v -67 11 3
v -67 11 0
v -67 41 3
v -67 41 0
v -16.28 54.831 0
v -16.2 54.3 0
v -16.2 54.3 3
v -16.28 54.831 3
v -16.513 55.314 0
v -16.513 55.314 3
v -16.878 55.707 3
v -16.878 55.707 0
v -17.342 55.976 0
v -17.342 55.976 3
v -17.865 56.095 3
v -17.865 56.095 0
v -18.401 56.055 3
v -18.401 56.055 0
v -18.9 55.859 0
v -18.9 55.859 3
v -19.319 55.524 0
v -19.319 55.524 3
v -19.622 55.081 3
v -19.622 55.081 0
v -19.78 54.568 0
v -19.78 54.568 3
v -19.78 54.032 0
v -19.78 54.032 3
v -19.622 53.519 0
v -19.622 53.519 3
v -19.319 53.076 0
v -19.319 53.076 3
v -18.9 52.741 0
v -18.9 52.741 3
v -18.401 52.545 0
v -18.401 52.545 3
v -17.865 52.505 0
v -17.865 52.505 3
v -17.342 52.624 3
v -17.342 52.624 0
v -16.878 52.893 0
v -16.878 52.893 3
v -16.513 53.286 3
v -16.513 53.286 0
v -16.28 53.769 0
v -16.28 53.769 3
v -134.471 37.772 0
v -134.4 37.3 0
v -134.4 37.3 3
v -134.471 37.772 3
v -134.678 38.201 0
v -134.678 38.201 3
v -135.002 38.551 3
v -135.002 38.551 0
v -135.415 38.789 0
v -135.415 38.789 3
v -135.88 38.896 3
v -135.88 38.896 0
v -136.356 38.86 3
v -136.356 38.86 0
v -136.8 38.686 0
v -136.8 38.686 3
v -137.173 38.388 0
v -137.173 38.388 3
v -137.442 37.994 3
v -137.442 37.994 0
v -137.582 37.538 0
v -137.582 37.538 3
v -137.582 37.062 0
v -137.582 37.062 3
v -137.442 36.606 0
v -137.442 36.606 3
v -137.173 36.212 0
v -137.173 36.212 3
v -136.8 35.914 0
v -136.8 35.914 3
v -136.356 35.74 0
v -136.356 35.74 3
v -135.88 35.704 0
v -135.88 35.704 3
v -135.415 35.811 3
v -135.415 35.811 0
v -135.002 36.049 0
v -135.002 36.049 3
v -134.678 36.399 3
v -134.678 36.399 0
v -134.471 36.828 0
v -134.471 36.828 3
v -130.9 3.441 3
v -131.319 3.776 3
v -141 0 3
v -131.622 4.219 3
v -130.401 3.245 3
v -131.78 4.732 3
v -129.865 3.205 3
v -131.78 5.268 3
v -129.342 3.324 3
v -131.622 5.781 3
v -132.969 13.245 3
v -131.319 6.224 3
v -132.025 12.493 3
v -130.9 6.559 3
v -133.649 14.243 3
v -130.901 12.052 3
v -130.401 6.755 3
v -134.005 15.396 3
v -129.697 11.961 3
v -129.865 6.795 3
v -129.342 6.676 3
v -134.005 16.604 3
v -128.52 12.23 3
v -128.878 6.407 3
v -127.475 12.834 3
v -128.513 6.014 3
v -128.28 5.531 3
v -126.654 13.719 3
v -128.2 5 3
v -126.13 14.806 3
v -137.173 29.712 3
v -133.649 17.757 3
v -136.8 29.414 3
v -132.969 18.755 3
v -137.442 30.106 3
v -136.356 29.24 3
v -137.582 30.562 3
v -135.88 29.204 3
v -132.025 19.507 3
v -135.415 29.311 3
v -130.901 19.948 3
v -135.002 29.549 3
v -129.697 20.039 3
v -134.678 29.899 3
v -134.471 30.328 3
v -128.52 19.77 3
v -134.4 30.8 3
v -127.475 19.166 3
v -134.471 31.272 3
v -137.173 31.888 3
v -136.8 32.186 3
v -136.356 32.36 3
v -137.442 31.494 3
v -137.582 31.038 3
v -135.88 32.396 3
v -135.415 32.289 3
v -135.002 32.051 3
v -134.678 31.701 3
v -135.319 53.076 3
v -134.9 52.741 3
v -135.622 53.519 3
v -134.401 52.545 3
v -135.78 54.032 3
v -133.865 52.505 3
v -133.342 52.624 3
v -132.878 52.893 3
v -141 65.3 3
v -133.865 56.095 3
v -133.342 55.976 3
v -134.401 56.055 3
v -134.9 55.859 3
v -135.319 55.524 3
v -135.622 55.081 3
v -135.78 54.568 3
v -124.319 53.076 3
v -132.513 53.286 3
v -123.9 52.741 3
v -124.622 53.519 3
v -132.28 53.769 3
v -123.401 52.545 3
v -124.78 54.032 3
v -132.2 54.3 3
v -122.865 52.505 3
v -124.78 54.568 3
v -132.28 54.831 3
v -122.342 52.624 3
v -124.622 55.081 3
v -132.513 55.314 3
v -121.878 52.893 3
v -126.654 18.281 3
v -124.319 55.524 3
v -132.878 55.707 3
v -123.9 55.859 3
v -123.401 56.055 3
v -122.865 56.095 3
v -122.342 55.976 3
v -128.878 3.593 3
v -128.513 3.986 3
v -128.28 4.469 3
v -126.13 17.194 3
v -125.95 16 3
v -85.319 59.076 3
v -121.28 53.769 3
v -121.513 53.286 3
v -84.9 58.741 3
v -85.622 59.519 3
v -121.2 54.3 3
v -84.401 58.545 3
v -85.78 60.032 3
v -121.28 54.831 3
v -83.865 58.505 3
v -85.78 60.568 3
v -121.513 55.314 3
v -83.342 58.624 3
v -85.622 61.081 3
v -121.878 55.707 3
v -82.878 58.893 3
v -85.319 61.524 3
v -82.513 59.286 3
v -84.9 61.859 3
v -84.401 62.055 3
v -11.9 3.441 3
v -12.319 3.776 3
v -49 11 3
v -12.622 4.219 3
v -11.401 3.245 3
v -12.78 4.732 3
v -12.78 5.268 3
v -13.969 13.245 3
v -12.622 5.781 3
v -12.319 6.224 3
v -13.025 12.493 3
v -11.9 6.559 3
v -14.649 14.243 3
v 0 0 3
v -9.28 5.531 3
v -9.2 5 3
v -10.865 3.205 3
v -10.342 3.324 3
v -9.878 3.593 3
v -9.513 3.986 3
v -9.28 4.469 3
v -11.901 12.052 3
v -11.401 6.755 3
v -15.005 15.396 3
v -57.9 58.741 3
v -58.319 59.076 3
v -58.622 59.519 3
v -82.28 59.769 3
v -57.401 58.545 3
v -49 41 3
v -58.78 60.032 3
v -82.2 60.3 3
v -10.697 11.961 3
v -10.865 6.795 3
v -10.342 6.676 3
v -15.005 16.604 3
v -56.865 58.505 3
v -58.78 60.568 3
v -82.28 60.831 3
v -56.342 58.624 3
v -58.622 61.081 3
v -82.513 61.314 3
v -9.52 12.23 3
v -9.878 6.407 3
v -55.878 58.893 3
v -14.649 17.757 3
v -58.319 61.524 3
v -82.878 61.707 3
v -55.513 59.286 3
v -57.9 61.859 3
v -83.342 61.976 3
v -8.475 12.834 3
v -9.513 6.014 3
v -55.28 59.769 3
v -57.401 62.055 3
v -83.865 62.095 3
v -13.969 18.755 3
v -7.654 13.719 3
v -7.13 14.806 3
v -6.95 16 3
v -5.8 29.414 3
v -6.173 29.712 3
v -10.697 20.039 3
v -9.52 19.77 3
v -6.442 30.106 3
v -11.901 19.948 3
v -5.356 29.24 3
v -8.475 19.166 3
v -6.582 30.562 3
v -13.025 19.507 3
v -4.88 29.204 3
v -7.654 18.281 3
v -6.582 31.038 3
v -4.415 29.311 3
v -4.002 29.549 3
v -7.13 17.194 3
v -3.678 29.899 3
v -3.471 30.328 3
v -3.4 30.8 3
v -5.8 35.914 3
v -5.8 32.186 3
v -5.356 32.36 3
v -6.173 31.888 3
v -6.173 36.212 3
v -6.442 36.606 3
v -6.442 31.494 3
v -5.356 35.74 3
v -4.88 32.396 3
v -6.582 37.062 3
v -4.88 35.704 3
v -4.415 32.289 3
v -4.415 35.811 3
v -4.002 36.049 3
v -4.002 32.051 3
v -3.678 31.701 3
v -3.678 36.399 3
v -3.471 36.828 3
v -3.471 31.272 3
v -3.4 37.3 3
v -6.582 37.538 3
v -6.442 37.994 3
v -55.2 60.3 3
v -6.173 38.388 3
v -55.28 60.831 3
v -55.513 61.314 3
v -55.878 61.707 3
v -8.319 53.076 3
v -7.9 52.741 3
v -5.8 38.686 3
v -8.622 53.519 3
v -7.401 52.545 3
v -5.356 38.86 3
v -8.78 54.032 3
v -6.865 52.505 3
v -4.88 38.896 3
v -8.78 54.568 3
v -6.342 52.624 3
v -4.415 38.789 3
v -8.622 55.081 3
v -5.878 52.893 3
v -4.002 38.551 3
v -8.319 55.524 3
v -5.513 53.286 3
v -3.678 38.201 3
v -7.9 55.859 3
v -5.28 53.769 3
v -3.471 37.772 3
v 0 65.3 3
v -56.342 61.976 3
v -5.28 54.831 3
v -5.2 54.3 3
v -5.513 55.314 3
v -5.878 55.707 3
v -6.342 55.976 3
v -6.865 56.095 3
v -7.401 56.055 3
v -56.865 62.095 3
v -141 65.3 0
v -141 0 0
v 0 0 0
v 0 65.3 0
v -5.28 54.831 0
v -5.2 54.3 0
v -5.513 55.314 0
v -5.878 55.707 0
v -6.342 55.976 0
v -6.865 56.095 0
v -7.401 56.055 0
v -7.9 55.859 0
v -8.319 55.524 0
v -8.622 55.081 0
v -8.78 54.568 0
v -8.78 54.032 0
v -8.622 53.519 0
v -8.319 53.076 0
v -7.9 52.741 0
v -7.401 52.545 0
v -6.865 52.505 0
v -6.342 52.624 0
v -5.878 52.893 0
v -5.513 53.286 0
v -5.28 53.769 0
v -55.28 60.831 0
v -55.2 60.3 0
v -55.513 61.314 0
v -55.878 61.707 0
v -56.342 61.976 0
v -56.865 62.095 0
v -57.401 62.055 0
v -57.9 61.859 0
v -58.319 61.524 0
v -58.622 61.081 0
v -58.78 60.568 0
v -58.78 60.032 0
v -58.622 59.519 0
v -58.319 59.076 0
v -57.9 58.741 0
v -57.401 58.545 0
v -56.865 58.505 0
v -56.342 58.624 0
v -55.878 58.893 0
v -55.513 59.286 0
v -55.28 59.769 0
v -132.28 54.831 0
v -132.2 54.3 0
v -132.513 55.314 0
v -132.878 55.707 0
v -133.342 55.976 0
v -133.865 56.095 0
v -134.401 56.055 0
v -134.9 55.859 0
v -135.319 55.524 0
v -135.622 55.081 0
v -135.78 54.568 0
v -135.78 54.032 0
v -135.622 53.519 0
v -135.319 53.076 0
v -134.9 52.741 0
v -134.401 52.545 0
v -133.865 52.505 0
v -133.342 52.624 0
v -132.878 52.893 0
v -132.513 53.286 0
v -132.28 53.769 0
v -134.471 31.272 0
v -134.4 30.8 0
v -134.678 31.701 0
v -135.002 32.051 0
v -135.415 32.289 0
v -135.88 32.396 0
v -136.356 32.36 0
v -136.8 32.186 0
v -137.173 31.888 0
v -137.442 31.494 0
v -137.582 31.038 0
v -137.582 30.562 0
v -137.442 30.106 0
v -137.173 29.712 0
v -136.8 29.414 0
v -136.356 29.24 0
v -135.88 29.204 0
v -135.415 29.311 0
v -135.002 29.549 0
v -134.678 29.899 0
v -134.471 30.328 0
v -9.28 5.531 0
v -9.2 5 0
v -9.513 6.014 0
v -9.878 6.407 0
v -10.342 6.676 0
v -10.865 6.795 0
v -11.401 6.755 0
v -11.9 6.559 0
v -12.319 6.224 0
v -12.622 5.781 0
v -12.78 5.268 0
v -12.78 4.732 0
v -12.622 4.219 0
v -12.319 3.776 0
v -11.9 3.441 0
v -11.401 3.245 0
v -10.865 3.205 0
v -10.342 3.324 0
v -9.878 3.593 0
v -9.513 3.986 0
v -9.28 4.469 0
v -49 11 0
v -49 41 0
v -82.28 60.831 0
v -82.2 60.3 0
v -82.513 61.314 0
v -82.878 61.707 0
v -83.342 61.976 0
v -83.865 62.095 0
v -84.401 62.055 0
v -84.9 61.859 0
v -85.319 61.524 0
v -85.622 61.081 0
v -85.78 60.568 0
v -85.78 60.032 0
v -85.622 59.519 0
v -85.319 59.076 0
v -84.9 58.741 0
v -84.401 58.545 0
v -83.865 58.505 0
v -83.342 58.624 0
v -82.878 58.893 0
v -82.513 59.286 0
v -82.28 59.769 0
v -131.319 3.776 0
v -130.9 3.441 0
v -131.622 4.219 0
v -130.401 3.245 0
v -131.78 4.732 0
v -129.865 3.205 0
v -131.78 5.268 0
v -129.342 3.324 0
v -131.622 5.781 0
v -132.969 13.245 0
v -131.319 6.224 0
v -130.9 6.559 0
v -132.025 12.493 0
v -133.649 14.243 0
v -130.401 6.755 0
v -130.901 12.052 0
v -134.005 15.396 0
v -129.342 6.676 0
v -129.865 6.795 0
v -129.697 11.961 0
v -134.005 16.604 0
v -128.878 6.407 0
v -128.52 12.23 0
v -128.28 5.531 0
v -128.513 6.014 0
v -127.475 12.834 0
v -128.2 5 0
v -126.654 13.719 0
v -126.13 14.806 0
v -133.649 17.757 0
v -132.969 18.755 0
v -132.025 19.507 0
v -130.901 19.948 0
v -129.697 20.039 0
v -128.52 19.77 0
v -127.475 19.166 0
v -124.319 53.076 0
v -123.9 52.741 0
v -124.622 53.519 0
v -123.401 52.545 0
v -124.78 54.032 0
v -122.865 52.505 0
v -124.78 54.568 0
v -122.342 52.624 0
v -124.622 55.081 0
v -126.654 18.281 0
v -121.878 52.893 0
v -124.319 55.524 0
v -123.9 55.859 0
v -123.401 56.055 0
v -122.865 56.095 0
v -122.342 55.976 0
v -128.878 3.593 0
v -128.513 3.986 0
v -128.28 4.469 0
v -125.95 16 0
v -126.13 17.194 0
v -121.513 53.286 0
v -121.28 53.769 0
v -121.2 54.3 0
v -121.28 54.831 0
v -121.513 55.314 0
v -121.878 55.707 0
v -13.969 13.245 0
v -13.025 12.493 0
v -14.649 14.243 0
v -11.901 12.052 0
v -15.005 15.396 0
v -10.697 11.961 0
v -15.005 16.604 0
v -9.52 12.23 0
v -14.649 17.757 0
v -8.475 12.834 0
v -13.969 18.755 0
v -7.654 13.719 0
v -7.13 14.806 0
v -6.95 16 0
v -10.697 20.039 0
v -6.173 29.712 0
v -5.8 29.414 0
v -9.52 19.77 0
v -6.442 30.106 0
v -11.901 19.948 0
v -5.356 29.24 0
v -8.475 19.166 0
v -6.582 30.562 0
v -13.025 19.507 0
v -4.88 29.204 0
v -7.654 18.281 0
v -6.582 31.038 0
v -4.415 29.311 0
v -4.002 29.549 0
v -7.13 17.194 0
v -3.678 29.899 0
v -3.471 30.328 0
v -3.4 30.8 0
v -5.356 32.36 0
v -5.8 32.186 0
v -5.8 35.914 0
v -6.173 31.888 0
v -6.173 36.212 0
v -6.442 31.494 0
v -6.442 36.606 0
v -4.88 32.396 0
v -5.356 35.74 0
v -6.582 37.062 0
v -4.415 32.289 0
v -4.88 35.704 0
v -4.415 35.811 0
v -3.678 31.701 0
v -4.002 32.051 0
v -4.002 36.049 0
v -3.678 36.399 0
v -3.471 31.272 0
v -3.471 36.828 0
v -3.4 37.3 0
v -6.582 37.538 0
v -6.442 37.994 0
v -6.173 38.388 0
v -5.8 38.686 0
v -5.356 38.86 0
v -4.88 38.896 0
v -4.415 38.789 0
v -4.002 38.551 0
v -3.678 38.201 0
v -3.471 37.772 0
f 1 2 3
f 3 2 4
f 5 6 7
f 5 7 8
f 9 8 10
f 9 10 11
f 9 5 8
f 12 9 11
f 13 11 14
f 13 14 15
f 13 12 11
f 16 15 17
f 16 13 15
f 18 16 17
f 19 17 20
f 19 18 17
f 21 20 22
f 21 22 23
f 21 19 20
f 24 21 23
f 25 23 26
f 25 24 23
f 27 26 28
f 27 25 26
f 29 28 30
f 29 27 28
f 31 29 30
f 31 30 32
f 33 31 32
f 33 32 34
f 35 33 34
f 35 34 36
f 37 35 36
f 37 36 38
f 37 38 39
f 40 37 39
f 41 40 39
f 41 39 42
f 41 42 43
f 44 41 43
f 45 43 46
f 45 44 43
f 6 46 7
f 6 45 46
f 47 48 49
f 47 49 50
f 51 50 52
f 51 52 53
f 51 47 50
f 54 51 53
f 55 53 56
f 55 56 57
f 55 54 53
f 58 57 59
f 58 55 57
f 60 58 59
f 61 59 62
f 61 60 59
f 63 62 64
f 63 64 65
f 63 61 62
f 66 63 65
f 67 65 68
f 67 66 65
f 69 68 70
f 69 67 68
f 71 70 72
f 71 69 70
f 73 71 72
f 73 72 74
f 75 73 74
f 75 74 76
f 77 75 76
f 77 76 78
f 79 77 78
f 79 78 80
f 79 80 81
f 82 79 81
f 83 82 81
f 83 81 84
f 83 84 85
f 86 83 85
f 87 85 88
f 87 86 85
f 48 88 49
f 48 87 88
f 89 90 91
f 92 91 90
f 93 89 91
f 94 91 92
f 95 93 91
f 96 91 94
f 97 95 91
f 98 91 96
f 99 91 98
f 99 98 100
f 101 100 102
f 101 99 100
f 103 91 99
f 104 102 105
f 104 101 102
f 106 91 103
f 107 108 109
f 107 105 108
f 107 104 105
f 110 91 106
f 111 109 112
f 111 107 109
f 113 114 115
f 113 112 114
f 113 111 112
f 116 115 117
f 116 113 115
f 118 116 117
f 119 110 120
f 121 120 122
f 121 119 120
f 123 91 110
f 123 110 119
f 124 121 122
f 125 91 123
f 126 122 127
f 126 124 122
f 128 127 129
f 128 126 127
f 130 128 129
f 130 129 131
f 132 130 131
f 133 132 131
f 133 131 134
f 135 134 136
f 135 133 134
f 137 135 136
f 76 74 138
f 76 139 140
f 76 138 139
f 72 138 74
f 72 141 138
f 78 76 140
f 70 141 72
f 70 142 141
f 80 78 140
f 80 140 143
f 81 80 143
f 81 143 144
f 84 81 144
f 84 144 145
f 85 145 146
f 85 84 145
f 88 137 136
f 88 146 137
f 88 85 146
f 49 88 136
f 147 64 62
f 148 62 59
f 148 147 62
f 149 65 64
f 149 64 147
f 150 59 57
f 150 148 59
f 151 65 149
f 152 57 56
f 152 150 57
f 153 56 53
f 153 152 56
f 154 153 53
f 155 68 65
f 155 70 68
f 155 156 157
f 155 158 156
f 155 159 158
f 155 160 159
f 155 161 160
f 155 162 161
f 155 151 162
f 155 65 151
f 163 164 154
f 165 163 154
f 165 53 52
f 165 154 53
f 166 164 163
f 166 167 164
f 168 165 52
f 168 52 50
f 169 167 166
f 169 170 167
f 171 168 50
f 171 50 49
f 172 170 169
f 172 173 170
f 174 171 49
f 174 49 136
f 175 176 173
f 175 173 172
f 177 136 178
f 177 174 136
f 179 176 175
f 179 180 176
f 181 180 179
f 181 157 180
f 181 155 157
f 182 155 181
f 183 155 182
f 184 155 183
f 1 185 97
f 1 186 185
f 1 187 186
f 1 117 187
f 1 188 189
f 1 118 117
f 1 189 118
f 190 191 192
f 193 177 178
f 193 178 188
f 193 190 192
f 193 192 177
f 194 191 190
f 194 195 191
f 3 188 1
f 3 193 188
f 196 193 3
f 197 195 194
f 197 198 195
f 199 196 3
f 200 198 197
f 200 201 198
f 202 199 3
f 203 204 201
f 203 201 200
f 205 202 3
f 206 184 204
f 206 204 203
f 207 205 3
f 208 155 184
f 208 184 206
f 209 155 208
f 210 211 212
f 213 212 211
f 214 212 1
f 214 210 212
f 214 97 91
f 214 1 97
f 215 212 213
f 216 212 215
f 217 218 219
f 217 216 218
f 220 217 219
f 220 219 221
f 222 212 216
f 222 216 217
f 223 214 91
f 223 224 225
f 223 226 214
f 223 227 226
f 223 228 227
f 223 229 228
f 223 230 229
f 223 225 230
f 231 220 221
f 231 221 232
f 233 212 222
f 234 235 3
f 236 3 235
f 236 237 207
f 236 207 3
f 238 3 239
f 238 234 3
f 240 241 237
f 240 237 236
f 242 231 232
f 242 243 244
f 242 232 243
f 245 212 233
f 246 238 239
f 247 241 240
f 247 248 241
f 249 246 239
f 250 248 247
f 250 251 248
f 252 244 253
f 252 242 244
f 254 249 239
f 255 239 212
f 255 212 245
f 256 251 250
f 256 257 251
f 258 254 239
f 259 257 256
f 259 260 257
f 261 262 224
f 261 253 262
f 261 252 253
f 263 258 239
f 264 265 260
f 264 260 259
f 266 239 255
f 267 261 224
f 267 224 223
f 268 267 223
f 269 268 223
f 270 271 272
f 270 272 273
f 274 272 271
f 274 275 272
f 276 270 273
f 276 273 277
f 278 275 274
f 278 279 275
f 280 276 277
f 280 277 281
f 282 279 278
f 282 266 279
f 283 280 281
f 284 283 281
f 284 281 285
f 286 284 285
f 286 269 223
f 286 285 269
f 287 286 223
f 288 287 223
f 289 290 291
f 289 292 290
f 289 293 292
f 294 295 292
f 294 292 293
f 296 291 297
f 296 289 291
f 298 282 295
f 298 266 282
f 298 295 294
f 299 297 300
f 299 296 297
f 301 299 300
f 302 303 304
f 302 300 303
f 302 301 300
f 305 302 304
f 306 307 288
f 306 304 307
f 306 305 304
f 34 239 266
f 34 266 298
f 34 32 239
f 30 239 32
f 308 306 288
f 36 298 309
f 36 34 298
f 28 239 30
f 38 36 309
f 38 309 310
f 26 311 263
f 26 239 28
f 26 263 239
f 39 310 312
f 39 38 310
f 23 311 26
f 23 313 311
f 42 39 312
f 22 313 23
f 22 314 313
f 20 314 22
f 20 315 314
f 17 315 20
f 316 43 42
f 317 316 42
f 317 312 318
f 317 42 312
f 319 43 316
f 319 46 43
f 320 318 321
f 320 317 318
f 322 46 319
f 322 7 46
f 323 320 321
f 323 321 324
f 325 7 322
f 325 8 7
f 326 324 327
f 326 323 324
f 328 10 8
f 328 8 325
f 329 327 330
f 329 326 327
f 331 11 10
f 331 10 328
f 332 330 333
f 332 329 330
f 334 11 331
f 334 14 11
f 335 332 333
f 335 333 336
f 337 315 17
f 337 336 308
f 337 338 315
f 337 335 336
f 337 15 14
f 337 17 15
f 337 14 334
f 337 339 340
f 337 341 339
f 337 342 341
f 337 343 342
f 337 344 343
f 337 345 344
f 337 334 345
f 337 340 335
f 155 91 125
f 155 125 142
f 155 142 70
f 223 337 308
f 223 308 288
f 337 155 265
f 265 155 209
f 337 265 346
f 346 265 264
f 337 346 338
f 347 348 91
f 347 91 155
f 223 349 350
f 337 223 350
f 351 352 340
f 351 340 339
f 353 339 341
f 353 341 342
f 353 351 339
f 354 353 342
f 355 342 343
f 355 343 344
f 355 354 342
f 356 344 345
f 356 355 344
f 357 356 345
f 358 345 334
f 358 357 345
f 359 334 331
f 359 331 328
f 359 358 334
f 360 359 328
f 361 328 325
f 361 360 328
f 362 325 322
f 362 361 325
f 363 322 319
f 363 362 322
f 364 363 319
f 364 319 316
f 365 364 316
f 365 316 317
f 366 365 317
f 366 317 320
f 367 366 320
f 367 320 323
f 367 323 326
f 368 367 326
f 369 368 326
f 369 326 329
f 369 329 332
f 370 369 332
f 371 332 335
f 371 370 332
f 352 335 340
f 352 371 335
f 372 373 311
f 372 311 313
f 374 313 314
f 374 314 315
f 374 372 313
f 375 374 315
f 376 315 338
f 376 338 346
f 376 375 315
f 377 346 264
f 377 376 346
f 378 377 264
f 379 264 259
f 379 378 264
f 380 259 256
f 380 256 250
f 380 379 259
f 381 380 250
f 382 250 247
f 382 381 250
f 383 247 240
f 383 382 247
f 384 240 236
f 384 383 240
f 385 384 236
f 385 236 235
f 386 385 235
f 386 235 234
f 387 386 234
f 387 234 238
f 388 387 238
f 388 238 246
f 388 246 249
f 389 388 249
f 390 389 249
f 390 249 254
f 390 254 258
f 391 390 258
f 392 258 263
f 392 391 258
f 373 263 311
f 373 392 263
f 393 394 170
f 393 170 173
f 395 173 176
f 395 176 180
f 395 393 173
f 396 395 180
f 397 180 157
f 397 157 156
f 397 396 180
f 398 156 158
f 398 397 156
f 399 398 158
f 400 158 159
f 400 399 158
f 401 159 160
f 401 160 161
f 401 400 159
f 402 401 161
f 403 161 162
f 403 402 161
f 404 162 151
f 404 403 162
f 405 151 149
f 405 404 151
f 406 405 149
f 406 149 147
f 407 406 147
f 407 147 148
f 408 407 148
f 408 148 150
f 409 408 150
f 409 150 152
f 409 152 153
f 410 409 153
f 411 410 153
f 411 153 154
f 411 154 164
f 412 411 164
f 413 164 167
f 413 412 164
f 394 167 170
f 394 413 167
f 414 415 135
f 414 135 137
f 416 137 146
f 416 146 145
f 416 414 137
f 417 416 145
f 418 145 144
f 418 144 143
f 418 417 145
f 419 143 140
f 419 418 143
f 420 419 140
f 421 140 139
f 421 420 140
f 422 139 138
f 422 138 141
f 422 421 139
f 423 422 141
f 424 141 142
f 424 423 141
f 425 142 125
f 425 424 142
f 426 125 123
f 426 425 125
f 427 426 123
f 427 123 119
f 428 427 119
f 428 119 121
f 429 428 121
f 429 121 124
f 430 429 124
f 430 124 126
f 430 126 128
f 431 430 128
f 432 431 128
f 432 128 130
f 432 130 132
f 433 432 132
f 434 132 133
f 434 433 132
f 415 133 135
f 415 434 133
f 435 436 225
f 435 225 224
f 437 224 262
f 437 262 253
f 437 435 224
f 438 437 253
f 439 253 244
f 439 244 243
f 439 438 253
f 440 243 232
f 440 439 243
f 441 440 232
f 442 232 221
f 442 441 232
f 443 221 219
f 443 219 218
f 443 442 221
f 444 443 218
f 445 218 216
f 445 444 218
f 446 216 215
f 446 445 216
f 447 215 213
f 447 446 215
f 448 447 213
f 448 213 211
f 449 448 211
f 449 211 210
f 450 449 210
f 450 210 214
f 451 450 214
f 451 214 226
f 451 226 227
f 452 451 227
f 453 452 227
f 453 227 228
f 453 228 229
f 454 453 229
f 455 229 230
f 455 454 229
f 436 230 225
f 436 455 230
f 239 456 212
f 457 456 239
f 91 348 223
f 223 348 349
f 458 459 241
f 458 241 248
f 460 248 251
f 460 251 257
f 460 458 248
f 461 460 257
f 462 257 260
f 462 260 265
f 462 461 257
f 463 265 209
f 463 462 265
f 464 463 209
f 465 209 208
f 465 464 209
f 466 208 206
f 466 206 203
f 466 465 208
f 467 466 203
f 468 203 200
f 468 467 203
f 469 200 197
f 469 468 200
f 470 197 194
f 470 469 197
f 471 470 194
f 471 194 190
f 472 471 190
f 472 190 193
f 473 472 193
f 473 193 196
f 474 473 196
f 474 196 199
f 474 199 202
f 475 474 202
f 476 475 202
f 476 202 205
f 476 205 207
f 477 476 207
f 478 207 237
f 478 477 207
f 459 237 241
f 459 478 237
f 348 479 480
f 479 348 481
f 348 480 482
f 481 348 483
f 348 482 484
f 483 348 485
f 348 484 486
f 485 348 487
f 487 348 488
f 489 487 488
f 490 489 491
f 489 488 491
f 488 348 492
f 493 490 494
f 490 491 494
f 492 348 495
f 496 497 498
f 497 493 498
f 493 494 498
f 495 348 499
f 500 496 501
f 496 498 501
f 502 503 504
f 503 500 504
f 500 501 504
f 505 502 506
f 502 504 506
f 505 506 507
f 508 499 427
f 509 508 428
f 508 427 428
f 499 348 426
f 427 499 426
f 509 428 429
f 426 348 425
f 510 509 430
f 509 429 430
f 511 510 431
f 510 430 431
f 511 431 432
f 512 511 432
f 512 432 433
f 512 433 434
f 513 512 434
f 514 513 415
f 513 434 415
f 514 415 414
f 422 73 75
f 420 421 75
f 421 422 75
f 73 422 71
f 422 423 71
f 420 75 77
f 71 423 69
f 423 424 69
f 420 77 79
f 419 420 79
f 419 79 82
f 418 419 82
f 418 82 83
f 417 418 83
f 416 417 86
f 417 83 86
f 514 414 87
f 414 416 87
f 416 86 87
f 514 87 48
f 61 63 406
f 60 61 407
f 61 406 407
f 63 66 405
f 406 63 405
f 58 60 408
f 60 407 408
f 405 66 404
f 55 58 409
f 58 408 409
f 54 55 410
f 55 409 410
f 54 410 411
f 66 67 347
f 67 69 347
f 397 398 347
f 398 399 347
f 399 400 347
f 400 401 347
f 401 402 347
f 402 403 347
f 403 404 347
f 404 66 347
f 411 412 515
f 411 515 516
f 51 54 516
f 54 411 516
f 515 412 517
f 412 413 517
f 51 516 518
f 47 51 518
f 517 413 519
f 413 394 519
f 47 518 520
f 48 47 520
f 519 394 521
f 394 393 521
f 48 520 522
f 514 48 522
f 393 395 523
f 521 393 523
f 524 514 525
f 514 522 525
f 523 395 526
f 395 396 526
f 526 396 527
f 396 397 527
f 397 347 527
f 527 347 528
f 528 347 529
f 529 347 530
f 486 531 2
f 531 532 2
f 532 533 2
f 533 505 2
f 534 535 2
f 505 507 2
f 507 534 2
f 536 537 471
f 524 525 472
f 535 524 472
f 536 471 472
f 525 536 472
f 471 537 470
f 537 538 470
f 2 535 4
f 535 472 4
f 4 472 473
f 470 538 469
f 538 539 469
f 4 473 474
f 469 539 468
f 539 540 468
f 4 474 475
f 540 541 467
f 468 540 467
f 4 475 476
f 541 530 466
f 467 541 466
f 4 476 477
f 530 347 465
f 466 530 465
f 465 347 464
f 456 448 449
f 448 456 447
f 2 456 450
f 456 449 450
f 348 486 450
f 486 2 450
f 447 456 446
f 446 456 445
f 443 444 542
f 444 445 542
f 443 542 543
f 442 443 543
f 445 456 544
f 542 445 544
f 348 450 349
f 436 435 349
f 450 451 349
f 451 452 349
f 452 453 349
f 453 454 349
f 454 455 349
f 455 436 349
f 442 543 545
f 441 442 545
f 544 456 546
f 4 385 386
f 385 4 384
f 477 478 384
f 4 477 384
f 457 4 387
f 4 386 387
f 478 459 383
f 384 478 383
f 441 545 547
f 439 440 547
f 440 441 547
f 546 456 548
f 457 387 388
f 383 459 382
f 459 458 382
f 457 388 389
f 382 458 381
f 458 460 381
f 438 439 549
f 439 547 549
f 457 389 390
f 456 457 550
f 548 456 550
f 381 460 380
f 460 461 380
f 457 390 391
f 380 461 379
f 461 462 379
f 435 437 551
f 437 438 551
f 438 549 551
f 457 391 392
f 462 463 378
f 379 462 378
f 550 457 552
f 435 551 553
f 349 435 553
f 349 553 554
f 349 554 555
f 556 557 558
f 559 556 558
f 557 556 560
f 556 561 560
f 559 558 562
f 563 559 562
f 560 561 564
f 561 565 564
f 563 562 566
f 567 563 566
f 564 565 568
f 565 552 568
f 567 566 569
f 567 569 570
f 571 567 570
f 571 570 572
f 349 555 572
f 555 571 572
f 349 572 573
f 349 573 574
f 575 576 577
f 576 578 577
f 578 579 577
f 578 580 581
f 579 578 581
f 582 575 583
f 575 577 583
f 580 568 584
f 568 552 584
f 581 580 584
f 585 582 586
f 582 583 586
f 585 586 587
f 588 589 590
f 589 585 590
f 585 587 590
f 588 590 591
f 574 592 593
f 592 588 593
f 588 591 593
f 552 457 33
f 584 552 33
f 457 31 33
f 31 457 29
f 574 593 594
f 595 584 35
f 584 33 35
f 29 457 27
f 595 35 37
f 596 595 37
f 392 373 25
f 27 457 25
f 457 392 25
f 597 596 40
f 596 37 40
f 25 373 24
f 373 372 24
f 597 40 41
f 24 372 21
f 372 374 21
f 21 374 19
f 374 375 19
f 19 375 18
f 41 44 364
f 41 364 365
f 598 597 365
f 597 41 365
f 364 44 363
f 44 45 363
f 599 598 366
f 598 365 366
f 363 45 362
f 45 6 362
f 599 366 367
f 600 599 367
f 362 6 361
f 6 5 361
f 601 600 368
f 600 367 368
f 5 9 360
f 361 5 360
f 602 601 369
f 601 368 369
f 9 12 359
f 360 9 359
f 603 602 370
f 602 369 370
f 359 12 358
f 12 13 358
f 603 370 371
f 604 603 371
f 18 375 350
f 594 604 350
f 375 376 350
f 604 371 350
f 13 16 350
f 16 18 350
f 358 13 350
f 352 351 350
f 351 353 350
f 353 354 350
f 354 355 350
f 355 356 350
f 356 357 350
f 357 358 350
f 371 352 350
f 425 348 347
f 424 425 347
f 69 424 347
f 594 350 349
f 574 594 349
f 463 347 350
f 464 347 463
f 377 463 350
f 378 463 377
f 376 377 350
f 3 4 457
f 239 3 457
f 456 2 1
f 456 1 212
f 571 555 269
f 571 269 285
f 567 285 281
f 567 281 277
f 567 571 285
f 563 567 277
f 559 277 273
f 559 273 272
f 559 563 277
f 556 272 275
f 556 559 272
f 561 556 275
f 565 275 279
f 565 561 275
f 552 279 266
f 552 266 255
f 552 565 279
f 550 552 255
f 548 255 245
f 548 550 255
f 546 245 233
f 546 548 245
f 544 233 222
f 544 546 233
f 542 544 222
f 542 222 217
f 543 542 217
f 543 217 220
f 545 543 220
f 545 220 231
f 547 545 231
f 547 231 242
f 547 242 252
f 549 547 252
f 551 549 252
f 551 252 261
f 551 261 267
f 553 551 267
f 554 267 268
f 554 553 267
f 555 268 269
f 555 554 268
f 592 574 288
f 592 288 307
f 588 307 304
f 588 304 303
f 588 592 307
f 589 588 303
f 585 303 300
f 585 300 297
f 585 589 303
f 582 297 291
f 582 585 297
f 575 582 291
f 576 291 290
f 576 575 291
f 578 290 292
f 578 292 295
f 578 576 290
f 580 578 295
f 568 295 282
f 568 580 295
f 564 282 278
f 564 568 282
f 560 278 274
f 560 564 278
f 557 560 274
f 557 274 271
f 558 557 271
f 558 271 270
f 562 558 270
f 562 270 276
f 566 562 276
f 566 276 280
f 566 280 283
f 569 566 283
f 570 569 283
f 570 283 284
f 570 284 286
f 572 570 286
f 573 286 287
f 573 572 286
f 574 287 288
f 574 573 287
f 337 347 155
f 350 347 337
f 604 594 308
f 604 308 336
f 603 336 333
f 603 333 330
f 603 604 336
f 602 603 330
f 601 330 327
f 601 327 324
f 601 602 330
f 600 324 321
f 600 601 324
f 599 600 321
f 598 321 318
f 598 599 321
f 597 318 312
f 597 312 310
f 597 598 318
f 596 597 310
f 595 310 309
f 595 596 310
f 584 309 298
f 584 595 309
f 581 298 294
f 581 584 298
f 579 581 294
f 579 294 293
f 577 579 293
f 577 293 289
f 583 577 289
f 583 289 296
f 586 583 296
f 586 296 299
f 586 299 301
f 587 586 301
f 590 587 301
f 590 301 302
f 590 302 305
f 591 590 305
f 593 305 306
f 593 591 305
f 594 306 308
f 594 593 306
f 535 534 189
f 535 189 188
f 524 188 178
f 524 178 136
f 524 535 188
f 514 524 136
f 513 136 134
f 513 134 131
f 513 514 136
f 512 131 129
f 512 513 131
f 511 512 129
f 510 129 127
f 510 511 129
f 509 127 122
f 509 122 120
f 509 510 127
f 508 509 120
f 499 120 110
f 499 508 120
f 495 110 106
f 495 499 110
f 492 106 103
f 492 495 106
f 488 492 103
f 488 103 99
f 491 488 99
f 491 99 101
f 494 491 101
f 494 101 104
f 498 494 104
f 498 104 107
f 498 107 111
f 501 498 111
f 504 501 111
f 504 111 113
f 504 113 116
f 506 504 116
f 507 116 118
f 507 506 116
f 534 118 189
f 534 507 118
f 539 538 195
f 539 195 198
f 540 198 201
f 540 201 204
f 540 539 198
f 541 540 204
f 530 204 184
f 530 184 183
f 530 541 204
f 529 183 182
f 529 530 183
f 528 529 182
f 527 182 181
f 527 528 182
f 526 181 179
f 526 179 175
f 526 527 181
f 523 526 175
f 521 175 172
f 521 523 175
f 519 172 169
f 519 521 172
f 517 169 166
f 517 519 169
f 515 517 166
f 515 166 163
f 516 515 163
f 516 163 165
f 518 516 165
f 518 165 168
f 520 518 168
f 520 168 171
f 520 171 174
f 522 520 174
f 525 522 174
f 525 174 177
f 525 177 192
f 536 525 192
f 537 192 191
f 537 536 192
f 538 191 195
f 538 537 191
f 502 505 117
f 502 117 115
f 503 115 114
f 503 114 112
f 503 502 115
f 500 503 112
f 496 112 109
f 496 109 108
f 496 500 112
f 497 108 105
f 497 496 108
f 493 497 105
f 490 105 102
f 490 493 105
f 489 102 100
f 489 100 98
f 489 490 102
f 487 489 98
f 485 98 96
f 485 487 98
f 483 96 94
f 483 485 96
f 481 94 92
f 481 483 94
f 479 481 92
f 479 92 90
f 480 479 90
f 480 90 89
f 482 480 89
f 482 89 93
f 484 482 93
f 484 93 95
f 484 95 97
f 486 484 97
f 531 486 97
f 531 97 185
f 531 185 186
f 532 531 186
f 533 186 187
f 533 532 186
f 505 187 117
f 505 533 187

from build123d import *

# Parameters (mm, degrees)
SKETCH_W   = 141
SKETCH_H   = 65.3
SKETCH_R   = 4.05
SKETCH_R_2 = 1.8
SKETCH_R_3 = 1.6
SKETCH_W_2 = 18
SKETCH_H_2 = 30
PAD_DEPTH  = 3


with BuildPart() as part:
    # Sketch → Pad (new body)
    with BuildSketch(Plane.XY):
        with Locations((-70.5, 32.65)):
            Rectangle(SKETCH_W, SKETCH_H)
        with Locations((-130, 16)):
            Circle(SKETCH_R, mode=Mode.SUBTRACT)
        with Locations((-11, 16)):
            Circle(SKETCH_R, mode=Mode.SUBTRACT)
        with Locations((-134, 54.3)):
            Circle(SKETCH_R_2, mode=Mode.SUBTRACT)
        with Locations((-123, 54.3)):
            Circle(SKETCH_R_2, mode=Mode.SUBTRACT)
        with Locations((-18, 54.3)):
            Circle(SKETCH_R_2, mode=Mode.SUBTRACT)
        with Locations((-7, 54.3)):
            Circle(SKETCH_R_2, mode=Mode.SUBTRACT)
        with Locations((-5, 37.3)):
            Circle(SKETCH_R_3, mode=Mode.SUBTRACT)
        with Locations((-5, 30.8)):
            Circle(SKETCH_R_3, mode=Mode.SUBTRACT)
        with Locations((-136, 37.3)):
            Circle(SKETCH_R_3, mode=Mode.SUBTRACT)
        with Locations((-136, 30.8)):
            Circle(SKETCH_R_3, mode=Mode.SUBTRACT)
        with Locations((-84, 60.3)):
            Circle(SKETCH_R_2, mode=Mode.SUBTRACT)
        with Locations((-57, 60.3)):
            Circle(SKETCH_R_2, mode=Mode.SUBTRACT)
        with Locations((-130, 5)):
            Circle(SKETCH_R_2, mode=Mode.SUBTRACT)
        with Locations((-11, 5)):
            Circle(SKETCH_R_2, mode=Mode.SUBTRACT)
        with Locations((-58, 26)):
            Rectangle(SKETCH_W_2, SKETCH_H_2, mode=Mode.SUBTRACT)
    extrude(amount=PAD_DEPTH)


solid = part.part
